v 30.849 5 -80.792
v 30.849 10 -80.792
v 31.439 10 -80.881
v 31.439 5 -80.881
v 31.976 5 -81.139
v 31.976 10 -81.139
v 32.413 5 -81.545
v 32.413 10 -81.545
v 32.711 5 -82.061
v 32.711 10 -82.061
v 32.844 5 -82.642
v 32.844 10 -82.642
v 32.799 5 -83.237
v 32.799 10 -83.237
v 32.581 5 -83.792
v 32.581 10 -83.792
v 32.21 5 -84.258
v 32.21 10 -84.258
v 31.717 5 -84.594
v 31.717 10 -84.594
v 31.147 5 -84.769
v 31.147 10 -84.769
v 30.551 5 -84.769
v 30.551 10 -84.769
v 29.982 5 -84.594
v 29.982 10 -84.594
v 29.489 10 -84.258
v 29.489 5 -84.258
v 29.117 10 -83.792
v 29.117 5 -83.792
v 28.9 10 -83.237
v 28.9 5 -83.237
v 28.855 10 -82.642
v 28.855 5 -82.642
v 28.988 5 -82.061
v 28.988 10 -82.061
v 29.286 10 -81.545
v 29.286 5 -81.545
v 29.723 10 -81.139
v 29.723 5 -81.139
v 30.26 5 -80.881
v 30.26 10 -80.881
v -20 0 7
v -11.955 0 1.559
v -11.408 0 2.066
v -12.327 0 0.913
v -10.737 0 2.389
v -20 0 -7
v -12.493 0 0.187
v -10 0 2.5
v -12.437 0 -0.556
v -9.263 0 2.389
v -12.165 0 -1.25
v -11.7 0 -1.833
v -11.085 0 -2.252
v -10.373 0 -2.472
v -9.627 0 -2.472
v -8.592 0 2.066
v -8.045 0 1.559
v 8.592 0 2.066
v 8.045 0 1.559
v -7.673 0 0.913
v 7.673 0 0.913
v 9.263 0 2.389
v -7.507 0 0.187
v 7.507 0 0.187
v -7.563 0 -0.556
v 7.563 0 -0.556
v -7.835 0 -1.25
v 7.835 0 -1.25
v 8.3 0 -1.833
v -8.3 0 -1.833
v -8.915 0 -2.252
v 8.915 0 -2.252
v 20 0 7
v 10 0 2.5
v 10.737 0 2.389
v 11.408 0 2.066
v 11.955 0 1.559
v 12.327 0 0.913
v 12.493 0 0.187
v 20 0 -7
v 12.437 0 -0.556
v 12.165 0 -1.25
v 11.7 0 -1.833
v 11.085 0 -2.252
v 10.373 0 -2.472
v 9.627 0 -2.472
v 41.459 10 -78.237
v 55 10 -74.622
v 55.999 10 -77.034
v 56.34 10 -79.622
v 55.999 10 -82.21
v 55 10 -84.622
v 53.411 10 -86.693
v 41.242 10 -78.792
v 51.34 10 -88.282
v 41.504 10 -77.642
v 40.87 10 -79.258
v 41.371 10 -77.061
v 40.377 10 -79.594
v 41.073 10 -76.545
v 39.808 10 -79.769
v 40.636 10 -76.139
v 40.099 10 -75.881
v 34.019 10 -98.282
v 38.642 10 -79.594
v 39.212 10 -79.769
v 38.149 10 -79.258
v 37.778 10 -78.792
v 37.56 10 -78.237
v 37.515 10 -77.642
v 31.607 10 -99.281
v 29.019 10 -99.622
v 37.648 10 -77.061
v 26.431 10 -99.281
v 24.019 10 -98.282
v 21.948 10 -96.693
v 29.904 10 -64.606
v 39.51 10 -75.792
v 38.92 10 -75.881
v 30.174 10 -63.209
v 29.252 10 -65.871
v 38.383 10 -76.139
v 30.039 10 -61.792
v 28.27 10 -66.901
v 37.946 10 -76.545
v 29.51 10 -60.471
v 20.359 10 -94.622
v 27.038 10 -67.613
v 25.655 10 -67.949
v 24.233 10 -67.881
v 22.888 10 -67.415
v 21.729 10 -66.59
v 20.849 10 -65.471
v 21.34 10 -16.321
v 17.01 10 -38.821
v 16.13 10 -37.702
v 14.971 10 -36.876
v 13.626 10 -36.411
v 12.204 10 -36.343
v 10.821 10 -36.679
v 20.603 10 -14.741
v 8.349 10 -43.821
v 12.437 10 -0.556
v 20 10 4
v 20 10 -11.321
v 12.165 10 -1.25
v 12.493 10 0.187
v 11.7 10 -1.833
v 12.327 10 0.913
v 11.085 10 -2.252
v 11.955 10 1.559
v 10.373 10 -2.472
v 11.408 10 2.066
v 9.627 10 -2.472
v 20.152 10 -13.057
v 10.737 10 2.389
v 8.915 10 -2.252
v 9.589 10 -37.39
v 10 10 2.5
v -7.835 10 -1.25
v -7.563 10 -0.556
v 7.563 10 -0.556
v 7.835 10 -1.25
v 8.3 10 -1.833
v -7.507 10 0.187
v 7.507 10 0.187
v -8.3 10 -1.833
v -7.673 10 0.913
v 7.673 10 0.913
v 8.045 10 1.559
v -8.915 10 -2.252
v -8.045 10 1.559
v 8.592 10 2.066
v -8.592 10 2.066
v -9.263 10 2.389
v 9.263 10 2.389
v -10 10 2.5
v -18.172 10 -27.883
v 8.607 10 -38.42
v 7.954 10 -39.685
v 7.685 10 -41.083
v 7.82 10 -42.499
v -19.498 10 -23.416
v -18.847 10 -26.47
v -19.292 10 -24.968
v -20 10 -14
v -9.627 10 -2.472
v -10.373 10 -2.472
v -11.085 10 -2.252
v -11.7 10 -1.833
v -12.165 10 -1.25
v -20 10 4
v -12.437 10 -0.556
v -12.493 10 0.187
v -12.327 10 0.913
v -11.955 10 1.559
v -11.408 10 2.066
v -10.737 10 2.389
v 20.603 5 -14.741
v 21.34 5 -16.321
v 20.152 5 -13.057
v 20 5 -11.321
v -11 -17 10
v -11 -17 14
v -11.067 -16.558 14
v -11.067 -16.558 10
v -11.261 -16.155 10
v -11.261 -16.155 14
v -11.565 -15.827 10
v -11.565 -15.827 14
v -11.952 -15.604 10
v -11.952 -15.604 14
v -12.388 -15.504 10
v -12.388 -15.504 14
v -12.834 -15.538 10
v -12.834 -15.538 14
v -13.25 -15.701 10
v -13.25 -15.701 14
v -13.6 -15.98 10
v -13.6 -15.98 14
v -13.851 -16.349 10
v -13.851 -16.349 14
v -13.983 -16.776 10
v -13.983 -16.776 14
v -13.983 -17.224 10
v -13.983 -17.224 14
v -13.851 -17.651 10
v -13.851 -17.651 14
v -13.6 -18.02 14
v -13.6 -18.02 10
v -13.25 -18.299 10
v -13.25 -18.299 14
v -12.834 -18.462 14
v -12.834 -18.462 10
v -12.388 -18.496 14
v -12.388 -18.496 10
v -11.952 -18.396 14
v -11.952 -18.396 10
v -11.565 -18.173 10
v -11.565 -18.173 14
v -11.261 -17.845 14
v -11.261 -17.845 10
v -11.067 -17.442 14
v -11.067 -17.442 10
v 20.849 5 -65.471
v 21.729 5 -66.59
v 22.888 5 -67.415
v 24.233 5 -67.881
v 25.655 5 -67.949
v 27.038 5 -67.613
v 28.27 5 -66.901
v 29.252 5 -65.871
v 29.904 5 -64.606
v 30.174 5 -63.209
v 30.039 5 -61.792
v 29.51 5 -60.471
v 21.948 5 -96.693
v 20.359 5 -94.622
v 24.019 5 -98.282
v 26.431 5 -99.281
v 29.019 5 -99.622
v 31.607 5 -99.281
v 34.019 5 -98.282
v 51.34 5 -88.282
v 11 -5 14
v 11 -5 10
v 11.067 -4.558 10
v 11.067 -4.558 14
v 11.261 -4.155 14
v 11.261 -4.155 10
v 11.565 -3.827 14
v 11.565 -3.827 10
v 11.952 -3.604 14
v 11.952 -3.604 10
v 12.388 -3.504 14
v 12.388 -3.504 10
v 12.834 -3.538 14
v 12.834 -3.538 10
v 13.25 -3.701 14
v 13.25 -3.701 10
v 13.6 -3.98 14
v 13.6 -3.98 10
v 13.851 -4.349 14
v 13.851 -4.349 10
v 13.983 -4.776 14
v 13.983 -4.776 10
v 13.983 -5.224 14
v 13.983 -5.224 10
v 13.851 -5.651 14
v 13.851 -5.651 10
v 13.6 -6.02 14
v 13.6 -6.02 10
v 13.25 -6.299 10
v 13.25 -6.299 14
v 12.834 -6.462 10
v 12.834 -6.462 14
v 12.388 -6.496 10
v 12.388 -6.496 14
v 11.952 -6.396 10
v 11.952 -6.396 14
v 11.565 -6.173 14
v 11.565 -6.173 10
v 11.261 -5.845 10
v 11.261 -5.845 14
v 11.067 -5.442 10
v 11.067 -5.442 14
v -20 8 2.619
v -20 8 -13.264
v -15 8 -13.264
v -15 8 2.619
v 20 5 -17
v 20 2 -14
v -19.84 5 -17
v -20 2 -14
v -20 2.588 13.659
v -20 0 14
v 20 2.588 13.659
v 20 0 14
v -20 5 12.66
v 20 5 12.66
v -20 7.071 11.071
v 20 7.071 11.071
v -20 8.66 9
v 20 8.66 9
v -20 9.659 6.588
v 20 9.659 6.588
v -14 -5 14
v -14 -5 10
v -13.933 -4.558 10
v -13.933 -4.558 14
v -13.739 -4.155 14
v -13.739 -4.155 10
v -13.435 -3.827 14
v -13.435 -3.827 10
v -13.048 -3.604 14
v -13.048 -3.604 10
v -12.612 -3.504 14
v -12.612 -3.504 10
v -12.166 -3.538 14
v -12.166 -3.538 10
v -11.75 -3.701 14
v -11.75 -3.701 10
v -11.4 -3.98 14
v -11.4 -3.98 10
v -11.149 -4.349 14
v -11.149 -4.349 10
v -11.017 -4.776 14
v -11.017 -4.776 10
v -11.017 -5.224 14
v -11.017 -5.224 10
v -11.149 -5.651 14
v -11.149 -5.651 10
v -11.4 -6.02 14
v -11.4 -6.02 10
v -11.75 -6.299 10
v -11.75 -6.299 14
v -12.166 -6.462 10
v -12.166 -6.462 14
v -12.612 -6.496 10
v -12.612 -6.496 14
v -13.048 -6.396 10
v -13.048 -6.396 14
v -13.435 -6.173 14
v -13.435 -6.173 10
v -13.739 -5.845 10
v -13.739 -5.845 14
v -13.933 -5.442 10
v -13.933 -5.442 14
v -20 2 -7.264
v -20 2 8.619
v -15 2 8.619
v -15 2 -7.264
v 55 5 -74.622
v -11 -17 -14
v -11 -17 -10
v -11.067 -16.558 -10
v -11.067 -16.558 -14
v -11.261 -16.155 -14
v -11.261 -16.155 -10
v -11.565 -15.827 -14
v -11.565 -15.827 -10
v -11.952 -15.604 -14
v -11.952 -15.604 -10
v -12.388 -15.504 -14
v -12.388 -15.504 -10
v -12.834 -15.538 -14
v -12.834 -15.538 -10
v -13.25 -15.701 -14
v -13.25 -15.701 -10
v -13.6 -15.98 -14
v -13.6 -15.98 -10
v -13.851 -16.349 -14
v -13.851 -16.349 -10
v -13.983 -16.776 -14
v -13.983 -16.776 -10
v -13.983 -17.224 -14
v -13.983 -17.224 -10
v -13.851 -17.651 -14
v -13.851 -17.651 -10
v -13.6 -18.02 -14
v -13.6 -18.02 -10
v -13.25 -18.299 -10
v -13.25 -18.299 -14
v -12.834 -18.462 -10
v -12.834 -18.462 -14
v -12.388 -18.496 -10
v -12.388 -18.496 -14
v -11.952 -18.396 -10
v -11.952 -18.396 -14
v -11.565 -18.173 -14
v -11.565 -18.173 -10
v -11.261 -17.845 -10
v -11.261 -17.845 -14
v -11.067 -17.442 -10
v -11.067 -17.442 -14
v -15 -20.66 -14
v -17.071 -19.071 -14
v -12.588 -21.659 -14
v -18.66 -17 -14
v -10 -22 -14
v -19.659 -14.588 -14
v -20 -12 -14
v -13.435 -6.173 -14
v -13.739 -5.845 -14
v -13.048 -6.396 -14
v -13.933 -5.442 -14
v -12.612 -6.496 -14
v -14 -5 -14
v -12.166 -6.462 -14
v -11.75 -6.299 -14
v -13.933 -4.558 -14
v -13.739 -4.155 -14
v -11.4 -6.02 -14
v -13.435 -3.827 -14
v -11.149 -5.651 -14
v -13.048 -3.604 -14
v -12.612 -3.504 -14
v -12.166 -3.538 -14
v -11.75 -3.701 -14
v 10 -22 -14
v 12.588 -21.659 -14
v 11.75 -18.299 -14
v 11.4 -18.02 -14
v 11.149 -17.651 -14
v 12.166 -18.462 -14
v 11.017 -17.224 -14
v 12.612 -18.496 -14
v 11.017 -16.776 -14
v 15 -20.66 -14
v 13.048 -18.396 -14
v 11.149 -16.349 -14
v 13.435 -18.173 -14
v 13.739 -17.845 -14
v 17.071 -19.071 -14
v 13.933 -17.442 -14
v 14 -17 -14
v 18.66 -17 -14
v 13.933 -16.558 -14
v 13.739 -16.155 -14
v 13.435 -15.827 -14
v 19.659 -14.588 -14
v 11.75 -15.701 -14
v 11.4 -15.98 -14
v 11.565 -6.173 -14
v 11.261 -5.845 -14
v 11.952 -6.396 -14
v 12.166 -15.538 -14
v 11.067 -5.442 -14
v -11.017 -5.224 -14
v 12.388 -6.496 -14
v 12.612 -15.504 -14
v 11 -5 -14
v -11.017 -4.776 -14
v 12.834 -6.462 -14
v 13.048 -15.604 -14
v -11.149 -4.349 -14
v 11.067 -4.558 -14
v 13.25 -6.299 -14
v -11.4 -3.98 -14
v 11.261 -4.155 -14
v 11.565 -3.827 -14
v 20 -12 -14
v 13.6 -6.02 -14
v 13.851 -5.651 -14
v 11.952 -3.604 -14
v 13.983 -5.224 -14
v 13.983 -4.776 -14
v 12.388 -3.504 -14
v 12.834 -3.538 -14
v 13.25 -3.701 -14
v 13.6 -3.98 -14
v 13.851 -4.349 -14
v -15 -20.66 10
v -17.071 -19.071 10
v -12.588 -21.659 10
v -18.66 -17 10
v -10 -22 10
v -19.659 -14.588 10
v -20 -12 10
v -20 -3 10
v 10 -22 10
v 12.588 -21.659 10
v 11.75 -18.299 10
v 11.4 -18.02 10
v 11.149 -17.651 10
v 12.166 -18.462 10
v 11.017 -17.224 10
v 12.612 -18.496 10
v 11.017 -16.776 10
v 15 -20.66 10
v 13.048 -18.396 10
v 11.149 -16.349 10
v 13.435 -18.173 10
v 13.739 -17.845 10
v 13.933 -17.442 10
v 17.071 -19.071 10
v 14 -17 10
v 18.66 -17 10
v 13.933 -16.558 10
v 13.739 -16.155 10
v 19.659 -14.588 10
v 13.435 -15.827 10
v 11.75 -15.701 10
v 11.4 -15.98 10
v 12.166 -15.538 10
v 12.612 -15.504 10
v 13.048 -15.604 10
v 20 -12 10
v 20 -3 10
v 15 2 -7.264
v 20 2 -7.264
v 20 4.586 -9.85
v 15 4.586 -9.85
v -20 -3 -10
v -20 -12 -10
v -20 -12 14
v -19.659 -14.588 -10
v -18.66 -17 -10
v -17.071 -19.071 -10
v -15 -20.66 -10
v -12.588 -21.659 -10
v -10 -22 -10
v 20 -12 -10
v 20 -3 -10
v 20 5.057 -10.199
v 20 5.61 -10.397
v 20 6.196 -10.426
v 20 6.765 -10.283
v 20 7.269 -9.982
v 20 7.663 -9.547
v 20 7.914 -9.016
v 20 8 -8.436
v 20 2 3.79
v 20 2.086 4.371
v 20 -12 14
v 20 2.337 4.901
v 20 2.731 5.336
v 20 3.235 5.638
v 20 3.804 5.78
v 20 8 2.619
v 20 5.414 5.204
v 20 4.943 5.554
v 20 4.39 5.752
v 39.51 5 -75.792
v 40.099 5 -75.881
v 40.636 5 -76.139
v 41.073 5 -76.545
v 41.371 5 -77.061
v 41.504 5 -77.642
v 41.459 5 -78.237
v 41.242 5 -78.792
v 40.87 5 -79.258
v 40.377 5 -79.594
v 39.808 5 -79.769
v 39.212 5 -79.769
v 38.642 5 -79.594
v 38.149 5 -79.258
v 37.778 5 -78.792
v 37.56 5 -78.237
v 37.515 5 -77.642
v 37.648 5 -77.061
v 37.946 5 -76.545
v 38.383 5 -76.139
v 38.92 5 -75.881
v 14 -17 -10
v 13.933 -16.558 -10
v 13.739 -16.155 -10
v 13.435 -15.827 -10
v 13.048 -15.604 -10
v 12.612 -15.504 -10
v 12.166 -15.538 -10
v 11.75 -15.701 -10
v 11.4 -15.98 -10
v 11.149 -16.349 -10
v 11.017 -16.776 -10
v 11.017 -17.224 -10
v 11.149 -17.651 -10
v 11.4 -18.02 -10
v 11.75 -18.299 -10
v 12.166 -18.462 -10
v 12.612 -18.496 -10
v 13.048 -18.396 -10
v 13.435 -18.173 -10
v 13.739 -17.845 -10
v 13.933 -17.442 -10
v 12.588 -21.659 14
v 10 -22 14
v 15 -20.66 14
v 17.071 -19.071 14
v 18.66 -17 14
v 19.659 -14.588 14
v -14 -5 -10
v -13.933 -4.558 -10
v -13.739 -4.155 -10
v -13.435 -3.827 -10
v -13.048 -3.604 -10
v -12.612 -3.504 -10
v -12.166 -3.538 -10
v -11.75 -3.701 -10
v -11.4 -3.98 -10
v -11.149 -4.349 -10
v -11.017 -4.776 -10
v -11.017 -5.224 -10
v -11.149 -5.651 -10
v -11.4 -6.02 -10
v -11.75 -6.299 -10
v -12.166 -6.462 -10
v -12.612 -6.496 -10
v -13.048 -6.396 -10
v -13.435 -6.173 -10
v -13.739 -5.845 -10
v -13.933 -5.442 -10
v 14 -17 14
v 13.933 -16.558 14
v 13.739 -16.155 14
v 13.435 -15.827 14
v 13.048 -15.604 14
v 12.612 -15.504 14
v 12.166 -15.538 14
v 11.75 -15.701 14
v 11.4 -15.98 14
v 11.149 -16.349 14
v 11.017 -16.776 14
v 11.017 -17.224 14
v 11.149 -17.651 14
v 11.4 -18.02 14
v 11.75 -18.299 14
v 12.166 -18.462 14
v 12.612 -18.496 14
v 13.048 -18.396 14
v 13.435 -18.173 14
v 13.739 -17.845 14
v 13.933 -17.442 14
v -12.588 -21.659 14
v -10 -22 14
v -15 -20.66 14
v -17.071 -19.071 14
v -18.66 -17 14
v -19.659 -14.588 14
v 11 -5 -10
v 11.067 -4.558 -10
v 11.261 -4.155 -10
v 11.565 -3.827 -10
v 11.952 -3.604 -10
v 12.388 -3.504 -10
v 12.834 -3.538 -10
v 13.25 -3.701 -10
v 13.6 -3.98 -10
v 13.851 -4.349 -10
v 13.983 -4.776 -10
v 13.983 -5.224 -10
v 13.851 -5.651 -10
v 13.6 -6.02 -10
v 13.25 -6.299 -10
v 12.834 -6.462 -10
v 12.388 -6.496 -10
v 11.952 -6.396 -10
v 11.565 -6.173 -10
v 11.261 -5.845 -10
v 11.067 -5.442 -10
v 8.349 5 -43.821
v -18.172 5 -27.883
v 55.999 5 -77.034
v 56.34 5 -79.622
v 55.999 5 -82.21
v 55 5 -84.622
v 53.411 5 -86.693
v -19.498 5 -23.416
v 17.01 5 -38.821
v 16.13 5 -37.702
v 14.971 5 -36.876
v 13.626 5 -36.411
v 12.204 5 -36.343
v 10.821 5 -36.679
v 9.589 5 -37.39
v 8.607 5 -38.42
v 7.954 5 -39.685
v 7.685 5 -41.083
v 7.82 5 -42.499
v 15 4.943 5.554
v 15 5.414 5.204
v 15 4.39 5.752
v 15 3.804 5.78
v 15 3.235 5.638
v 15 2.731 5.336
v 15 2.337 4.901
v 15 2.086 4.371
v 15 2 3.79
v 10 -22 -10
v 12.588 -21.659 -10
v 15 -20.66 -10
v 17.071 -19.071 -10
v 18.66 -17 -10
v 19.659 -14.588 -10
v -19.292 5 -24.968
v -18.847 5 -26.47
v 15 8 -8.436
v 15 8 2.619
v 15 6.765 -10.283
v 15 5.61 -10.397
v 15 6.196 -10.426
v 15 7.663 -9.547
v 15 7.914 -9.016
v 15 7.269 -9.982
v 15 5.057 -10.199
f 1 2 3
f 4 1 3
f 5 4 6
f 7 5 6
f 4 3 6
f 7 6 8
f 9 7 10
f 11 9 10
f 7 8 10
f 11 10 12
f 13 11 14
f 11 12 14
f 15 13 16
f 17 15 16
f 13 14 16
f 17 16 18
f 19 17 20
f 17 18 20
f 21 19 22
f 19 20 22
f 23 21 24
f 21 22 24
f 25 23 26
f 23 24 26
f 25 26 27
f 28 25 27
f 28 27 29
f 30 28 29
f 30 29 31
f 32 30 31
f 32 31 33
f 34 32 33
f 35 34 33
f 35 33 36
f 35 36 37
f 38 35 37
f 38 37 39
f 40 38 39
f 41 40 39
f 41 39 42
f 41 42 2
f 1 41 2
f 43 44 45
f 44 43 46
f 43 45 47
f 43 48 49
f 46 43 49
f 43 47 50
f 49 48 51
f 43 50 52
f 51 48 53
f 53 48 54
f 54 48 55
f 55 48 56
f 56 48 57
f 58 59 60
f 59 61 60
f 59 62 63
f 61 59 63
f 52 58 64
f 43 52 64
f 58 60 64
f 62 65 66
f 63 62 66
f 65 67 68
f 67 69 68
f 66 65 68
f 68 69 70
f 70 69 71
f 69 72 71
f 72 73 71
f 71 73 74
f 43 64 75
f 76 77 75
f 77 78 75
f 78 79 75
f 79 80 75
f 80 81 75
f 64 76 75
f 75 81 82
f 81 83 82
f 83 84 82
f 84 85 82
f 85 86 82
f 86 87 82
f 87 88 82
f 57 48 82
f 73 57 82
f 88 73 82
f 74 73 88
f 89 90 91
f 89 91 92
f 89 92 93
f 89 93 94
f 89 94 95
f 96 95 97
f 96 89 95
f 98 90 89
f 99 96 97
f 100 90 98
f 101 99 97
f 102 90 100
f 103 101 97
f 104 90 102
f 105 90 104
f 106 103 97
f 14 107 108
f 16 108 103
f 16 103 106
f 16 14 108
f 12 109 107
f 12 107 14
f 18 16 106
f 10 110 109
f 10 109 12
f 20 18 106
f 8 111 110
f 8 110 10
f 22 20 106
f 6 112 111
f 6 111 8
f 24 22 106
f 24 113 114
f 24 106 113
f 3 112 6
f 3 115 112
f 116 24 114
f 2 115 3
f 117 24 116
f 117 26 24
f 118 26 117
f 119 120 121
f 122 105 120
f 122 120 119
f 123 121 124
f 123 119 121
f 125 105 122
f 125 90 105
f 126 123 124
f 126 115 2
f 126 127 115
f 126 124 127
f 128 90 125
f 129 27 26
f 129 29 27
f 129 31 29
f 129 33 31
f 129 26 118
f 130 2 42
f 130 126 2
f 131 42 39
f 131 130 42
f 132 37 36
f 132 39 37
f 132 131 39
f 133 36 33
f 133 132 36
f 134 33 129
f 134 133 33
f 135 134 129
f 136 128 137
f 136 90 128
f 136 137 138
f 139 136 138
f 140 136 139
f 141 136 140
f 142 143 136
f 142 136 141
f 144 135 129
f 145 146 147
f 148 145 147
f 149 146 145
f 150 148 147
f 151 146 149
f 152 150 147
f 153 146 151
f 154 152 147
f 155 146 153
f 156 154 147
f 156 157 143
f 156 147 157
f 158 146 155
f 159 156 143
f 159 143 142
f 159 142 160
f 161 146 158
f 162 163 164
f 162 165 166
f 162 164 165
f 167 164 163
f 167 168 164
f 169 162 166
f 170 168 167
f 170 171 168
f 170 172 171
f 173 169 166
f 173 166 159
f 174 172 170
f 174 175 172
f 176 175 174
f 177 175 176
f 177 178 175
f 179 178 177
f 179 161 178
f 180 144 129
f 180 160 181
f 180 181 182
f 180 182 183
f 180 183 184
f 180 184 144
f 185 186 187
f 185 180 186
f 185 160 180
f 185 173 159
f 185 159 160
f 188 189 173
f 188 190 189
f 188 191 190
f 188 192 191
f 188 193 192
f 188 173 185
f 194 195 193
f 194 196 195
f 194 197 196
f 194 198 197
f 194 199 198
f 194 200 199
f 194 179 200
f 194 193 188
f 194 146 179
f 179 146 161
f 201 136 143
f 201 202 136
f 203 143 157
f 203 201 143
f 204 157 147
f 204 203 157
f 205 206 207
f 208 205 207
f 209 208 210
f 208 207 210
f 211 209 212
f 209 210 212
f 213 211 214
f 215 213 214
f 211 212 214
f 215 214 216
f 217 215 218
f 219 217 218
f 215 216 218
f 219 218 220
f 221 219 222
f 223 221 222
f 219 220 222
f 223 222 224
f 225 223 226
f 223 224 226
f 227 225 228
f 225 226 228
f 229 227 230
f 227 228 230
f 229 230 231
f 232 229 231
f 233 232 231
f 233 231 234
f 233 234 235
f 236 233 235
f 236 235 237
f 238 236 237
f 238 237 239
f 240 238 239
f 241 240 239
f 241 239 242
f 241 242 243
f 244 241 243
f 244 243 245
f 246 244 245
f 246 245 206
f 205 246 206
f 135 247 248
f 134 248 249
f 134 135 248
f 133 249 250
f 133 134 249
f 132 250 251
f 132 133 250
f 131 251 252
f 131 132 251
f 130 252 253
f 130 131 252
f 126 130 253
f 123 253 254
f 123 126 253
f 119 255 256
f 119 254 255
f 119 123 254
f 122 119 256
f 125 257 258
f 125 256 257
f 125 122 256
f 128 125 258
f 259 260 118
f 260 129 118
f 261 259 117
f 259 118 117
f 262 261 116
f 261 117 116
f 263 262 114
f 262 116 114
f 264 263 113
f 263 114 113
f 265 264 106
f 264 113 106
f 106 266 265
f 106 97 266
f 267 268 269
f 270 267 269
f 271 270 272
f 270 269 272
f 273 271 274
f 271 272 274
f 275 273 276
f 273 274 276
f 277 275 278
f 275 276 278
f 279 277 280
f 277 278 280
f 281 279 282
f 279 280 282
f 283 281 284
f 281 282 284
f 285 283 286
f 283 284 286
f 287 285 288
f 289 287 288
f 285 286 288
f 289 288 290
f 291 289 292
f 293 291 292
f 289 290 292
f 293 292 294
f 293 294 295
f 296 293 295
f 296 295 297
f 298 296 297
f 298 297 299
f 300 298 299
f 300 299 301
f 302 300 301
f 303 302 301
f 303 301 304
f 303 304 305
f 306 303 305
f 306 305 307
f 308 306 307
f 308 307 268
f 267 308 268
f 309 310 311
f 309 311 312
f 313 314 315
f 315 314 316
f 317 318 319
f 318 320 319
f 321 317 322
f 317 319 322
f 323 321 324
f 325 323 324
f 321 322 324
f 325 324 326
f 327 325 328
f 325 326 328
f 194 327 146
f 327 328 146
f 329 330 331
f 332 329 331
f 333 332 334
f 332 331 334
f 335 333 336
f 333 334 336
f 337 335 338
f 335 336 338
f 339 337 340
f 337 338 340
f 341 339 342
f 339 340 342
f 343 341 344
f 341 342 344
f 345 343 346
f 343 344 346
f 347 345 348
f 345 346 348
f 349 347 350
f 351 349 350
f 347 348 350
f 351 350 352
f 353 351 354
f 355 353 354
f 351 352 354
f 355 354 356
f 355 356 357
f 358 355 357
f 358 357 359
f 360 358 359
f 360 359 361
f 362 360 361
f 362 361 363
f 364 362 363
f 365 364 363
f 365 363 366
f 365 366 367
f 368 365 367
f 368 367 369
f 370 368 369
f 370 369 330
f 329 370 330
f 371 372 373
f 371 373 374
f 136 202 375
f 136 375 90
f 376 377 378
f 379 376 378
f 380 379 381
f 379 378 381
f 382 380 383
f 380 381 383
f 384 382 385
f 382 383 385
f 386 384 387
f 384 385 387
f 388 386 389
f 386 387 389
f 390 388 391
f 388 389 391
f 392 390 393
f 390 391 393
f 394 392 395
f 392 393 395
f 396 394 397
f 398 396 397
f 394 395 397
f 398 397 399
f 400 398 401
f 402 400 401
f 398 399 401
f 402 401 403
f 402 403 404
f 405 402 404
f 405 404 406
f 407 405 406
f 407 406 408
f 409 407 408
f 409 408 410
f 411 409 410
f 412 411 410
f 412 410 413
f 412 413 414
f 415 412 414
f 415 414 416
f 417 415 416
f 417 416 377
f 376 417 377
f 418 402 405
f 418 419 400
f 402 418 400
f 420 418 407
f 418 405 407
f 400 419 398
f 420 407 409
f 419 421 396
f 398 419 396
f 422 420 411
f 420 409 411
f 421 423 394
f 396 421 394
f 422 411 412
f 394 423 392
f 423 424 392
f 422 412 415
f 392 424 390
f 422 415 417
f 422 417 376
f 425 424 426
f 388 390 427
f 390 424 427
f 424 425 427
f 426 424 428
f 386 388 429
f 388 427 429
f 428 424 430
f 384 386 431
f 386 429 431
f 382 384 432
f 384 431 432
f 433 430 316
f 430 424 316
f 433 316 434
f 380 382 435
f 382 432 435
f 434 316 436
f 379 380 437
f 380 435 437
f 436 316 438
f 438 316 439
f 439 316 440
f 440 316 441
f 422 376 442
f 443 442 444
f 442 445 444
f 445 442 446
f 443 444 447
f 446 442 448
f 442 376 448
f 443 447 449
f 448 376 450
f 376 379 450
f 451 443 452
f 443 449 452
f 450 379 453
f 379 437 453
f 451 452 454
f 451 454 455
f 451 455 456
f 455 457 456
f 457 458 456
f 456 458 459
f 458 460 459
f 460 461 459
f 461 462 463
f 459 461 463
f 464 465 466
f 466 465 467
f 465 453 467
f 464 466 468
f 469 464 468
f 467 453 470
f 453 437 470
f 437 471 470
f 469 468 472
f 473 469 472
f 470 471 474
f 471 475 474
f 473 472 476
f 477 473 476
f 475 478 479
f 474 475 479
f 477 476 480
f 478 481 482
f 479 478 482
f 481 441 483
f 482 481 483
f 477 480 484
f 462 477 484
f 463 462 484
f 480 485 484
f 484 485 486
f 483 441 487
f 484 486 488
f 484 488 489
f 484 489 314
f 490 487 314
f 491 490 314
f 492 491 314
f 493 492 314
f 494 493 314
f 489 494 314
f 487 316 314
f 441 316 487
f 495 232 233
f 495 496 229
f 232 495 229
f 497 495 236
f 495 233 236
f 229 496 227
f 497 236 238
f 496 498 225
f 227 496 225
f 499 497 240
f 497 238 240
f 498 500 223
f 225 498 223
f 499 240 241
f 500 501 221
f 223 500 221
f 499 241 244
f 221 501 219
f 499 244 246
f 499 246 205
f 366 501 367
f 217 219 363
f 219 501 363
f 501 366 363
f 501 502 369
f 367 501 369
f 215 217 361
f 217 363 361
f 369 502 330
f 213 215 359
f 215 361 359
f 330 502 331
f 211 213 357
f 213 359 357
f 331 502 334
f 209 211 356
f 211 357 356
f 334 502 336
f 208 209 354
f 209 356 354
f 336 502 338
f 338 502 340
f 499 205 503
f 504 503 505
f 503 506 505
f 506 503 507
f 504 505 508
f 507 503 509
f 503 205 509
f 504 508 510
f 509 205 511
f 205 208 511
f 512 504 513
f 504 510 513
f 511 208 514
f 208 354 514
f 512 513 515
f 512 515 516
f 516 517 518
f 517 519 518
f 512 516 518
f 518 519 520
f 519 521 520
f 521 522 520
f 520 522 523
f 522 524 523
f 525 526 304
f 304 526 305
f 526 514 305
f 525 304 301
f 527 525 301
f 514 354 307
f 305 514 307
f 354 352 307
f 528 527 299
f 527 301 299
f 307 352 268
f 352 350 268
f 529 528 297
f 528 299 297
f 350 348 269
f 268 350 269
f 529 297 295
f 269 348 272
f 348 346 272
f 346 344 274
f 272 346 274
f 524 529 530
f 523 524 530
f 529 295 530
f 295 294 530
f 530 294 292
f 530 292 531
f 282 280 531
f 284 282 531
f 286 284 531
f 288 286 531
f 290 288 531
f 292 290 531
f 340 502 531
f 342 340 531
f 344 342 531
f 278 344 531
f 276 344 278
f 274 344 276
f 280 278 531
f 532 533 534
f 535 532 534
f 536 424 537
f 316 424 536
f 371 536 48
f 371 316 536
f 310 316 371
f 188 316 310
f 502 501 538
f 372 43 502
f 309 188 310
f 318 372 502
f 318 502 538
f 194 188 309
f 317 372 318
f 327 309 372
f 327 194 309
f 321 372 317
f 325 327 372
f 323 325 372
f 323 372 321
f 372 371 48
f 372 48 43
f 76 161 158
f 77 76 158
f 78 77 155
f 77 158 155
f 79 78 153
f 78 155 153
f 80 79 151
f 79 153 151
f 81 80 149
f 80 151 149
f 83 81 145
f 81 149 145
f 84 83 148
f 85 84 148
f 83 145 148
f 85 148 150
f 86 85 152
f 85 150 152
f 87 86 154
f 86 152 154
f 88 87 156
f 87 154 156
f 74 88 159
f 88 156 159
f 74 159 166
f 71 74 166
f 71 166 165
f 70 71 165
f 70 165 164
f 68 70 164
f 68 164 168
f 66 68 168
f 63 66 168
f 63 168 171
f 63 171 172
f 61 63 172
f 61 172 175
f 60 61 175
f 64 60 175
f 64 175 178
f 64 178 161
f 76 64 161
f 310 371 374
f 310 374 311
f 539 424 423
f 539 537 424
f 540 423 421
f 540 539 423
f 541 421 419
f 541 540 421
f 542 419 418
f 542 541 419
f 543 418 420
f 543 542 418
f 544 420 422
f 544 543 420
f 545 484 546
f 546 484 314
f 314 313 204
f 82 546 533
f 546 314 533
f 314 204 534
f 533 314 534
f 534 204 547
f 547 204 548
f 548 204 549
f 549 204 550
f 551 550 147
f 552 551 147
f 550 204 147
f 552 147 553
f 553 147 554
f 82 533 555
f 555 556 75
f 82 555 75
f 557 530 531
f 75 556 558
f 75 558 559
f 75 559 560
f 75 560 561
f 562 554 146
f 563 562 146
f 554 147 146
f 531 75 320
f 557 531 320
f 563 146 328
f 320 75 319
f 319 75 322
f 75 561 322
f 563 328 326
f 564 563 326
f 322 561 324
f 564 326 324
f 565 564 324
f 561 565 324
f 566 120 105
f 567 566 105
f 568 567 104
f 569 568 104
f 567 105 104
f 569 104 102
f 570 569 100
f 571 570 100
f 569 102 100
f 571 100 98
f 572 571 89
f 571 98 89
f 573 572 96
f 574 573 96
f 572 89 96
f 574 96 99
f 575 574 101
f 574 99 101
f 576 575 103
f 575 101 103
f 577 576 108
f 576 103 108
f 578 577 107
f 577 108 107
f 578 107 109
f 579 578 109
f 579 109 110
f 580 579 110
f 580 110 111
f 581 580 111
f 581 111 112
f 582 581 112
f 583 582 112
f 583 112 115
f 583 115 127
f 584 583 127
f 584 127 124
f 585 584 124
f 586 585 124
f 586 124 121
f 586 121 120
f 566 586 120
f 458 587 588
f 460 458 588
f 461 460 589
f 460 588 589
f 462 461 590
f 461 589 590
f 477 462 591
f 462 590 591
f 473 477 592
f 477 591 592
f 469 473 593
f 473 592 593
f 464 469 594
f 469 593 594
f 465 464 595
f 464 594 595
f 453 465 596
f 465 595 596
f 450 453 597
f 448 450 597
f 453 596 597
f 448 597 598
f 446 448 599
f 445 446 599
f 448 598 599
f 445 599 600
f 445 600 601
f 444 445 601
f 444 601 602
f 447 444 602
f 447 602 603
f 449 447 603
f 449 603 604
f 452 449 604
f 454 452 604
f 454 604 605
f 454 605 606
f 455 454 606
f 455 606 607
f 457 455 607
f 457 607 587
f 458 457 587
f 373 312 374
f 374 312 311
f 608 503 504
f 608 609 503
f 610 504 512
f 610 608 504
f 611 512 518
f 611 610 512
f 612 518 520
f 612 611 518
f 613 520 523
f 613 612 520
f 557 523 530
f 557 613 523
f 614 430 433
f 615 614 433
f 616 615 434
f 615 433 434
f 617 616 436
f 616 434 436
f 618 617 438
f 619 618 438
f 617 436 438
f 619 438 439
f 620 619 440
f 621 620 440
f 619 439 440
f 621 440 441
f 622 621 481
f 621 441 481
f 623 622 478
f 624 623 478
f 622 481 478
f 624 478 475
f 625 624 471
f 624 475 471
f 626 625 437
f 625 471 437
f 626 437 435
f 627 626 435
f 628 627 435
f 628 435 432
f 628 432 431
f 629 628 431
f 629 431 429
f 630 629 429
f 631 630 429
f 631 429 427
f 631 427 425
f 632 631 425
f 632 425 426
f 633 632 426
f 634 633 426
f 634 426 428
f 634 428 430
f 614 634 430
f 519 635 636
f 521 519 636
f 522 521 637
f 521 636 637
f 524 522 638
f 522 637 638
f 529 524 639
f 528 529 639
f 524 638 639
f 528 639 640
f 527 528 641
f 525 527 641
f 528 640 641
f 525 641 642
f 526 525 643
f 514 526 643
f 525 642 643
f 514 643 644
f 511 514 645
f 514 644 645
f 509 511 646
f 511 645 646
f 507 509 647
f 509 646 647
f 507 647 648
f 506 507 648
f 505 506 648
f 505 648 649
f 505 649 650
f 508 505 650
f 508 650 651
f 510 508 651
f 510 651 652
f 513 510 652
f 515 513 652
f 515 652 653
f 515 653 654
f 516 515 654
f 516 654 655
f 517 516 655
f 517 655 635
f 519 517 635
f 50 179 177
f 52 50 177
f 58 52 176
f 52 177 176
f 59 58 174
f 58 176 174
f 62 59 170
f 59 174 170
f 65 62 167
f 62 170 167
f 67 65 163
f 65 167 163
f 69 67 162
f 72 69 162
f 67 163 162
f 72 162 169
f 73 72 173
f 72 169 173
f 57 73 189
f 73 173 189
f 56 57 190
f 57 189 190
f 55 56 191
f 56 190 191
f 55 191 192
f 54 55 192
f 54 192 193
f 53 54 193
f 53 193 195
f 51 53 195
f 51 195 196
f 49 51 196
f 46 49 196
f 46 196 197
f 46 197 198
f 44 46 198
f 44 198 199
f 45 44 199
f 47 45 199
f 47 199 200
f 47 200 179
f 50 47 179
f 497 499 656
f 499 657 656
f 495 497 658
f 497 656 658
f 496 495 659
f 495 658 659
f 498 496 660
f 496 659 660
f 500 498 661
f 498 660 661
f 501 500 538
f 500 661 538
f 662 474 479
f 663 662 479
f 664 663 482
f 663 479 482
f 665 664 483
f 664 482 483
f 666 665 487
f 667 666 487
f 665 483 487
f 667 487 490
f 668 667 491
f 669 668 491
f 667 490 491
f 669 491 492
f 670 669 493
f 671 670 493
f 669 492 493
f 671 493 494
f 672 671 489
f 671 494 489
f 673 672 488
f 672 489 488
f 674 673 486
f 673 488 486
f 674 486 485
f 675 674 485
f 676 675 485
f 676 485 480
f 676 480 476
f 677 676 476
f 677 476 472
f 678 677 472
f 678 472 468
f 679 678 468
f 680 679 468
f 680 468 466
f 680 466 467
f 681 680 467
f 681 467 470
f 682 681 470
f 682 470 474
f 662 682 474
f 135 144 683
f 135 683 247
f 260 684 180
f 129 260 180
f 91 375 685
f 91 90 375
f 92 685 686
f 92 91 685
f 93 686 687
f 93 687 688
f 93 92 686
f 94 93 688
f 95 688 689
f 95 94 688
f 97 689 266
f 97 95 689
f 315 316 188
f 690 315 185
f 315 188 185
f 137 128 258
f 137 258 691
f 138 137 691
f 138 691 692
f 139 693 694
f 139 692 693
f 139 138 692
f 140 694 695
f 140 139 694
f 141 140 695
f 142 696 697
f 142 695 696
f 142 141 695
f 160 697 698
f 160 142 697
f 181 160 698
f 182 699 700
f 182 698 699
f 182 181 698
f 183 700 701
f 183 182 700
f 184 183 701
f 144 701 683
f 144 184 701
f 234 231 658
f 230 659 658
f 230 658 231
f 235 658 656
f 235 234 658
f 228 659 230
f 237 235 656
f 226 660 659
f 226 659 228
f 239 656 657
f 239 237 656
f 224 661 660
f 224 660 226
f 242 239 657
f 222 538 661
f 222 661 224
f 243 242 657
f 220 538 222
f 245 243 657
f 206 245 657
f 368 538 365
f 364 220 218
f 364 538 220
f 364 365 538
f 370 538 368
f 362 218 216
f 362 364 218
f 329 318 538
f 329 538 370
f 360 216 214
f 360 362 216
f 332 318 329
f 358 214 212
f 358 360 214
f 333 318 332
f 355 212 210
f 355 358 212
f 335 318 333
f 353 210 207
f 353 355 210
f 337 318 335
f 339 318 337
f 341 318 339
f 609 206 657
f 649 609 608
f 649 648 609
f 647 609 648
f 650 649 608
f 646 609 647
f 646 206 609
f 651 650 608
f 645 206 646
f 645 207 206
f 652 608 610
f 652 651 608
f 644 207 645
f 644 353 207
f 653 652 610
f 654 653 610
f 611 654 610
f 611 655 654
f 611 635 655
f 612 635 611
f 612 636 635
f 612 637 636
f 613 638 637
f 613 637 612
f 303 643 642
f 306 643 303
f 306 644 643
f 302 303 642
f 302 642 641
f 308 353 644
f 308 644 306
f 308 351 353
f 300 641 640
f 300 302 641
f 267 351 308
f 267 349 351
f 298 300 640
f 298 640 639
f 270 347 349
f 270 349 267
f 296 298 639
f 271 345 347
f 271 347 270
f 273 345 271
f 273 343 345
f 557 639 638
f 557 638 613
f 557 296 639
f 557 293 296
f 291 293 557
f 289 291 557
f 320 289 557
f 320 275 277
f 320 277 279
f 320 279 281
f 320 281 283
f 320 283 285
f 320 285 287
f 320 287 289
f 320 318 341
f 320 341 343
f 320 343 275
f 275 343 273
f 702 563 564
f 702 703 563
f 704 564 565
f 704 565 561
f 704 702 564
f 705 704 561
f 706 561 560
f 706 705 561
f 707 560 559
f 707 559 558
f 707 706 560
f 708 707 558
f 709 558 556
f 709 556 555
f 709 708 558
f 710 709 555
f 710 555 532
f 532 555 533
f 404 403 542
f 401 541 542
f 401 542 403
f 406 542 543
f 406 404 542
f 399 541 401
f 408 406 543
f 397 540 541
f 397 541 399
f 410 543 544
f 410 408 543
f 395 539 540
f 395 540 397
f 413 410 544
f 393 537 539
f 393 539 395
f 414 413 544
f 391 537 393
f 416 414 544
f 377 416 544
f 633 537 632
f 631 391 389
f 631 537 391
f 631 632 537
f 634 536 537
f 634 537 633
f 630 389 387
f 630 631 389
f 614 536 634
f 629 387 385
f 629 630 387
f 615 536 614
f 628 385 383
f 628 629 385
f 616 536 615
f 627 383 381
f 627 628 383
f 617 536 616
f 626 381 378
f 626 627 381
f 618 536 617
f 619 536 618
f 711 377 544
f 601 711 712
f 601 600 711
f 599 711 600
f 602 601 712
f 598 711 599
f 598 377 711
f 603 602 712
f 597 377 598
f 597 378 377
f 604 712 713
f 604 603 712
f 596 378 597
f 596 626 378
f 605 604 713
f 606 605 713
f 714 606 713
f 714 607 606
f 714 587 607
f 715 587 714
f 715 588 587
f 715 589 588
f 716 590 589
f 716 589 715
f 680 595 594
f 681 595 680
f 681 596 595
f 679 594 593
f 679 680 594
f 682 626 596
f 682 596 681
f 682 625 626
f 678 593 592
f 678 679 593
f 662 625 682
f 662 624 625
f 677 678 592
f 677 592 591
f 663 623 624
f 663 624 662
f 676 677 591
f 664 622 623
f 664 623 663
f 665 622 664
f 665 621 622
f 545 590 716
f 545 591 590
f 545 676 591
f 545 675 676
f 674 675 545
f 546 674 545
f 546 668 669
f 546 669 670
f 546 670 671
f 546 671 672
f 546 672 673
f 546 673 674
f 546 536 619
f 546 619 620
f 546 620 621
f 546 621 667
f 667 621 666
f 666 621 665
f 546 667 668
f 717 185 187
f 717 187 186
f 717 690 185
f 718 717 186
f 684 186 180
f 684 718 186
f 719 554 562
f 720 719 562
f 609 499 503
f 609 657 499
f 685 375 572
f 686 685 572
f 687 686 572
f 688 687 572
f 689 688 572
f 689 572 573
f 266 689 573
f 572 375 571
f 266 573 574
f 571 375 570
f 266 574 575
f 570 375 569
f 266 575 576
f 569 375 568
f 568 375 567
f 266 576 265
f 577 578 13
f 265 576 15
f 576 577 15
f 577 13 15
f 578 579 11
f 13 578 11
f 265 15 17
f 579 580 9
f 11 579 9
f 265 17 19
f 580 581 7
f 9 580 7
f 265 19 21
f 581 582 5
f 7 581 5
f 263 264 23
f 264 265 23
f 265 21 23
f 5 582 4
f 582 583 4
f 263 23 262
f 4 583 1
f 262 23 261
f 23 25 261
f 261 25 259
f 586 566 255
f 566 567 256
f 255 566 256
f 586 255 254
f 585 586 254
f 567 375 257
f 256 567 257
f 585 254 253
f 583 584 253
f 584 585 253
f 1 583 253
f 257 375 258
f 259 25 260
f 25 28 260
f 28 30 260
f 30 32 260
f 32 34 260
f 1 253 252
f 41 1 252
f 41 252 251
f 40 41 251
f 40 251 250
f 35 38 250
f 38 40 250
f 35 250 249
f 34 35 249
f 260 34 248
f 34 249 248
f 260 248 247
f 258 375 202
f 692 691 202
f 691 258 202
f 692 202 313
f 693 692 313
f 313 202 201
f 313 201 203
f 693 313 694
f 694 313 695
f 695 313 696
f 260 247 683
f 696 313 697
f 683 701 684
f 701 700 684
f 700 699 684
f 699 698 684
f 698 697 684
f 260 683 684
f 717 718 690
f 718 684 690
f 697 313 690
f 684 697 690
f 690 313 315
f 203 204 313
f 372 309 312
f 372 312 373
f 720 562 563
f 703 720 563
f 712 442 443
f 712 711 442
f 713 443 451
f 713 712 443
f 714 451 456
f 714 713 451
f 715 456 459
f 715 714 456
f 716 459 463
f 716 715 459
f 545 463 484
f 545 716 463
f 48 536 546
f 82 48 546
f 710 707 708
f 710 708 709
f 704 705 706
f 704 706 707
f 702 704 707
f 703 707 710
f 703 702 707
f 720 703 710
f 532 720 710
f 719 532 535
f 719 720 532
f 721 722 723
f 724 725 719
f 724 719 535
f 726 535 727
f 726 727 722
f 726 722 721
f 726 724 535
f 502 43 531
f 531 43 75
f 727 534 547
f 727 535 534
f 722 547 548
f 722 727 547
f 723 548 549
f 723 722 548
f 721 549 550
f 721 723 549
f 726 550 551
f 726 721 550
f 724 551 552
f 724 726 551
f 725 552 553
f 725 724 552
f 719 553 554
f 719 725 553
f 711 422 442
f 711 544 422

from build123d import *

# Parameters (mm, degrees)
EXTRUDE_1_DEPTH      = 10
SKETCH_2_W           = 40
SKETCH_2_H           = 4
SKETCH_2_H_2         = 3.9999999999999982
EXTRUDE_2_DEPTH      = 10
SKETCH_4_W           = 40
SKETCH_4_H           = 5
EXTRUDE_3_DEPTH      = 15
SKETCH_6_W           = 40
SKETCH_6_H           = 5
EXTRUDE_4_DEPTH      = 15
SKETCH_8_R           = 2.5000000000000004
CUT_EXTRUDE_2_DEPTH  = 15
CHAMFER_1_SIZE       = 3
FILLET_1_R           = 10
CHAMFER_2_SIZE       = 3
SKETCH_9_R           = 1.5000000000000007
CUT_EXTRUDE_3_DEPTH  = 38.41657386773942
CUT_EXTRUDE_4_DEPTH  = 5
FILLET_3_R           = 2
SKETCH_11_W          = 40
SKETCH_11_H          = 6.999999999999998
SKETCH_11_H_2        = 7
EXTRUDE_5_DEPTH      = 3
CHAMFER_3_SIZE       = 1
SKETCH_12_W          = 40
SKETCH_12_H          = 5
EXTRUDE_6_DEPTH      = 30
FILLET_4_R           = 10
SKETCH_13_R          = 2
SKETCH_13_R_2        = 2.0000000000000027
CUT_EXTRUDE_5_DEPTH  = 30
EXTRUDE_START        = -5
EXTRUDE_7_DEPTH      = 5
CUT_EXTRUDE_6_DEPTH  = 5
SKETCH_16_W          = 20.000000000000007
SKETCH_16_H          = 9.517030698893077
CUT_EXTRUDE_7_DEPTH  = 122.15395545343927
SKETCH_17_W          = 40
SKETCH_17_H          = 3.9999999999999982
SKETCH_17_H_2        = 4
EXTRUDE_8_DEPTH      = 12
SKETCH_18_R          = 1.5000000000000007
SKETCH_18_R_2        = 1.5000000000000009
CUT_EXTRUDE_8_DEPTH  = 124.72425272933131
SKETCH_19_R          = 2.0000000000000067
SKETCH_19_R_2        = 2.0000000000000036
CUT_EXTRUDE_9_DEPTH  = 115.02754457592229
CUT_EXTRUDE_10_DEPTH = 115.02754457592229
EXTRUDE_9_DEPTH      = 5
SKETCH_23_R          = 2.0000000000000036
SKETCH_23_R_2        = 2.0000000000000067
CUT_EXTRUDE_11_DEPTH = 115.0275445759223
SKETCH_24_R          = 2.0000000000000067
SKETCH_24_R_2        = 2.0000000000000036
CUT_EXTRUDE_12_DEPTH = 115.02754457592229
CUT_EXTRUDE_13_DEPTH = 115.02754457592229
SKETCH_26_W          = 40
SKETCH_26_H          = 5
EXTRUDE_10_DEPTH     = 10
FILLET_6_R           = 10


with BuildPart() as part:
    # 草图1 → 凸台-拉伸1 (new body)
    with BuildSketch(Plane(origin=(0, 0, 0), x_dir=(1, 0, 0), z_dir=(0, 1, 0))):
        Polygon((20.000000000000004, 14.000000000000007), (-19.999999999999996, 14.000000000000002), (-19.999999999999996, -13.999999999999998), (20.000000000000004, -13.999999999999993), align=None)
    extrude(amount=EXTRUDE_1_DEPTH)

    # 草图2 → 凸台-拉伸2 (add)
    with BuildSketch(Plane.XZ):
        with Locations((3.55e-15, 11.999999999999998)):
            Rectangle(SKETCH_2_W, SKETCH_2_H)
        with Locations((3.55e-15, -12.000000000000007)):
            Rectangle(SKETCH_2_W, SKETCH_2_H_2)
    extrude(amount=EXTRUDE_2_DEPTH)

    # 草图4 → 凸台-拉伸3 (add)
    with BuildSketch(Plane(origin=(-1.82e-15, 0, -14.000000000000004), x_dir=(-1, 0, 1.3e-16), z_dir=(-1.3e-16, 0, -1))):
        with Locations((-7.11e-15, 7.5)):
            Rectangle(SKETCH_4_W, SKETCH_4_H)
    extrude(amount=EXTRUDE_3_DEPTH)

    # 草图6 → 凸台-拉伸4 (add)
    with BuildSketch(Plane(origin=(-3.77e-15, 0, -29.000000000000004), x_dir=(-1, 0, 1.3e-16), z_dir=(-1.3e-16, 0, -1))):
        with Locations((-3.55e-15, 7.5)):
            Rectangle(SKETCH_6_W, SKETCH_6_H)
    extrude(amount=EXTRUDE_4_DEPTH)

    # 草图8 → 切除-拉伸2 (cut)
    with BuildSketch(Plane(origin=(0, 10, 0), x_dir=(1, 0, 0), z_dir=(0, 1, 0))):
        with Locations(Location((-10.000000000000004, 1.73e-15, 0), (0, 0, 270))):
            Circle(SKETCH_8_R)
        with Locations(Location((10.000000000000002, 1.73e-15, 0), (0, 0, 270))):
            Circle(SKETCH_8_R)
    extrude(amount=-CUT_EXTRUDE_2_DEPTH, mode=Mode.SUBTRACT)

    # 倒角1
    chamfer_1_edges = [part.edges().sort_by_distance(p)[0] for p in [
        (3.55e-15, 0, 9.999999999999998),
        (3.55e-15, 0, -10.000000000000007),
    ]]
    chamfer(chamfer_1_edges, length=CHAMFER_1_SIZE)

    # 圆角1
    fillet_1_edges = [part.edges().sort_by_distance(p)[0] for p in [
        (3.55e-15, 10, 13.999999999999996),
    ]]
    fillet(fillet_1_edges, radius=FILLET_1_R)

    # 倒角2
    chamfer_2_edges = [part.edges().sort_by_distance(p)[0] for p in [
        (5.28e-15, 5, -14.000000000000004),
    ]]
    chamfer(chamfer_2_edges, length=CHAMFER_2_SIZE)

    # 草图9 → 切除-拉伸3 (cut, through all)
    with BuildSketch(Plane(origin=(-1.82e-15, 0, -14.000000000000004), x_dir=(-1, 0, 1.3e-16), z_dir=(-1.3e-16, 0, -1))):
        with Locations((-12.500000000000007, -5)):
            Circle(SKETCH_9_R)
        with Locations((12.499999999999993, -5)):
            Circle(SKETCH_9_R)
    extrude(amount=-CUT_EXTRUDE_3_DEPTH, mode=Mode.SUBTRACT)

    # 草图10 → 切除-拉伸4 (cut)
    with BuildSketch(Plane(origin=(20.000000000000004, 0, 0), x_dir=(0, 0, -1), z_dir=(1, 0, 0))):
        Polygon((-2.6185414170321746, 7.999999999999998), (-8.618541417032173, 2), (7.26407194166772, 2), (13.264071941667716, 8), align=None)
    cut_extrude_4 = extrude(amount=-CUT_EXTRUDE_4_DEPTH, mode=Mode.SUBTRACT)

    # 圆角3
    fillet_3_edges = [part.edges().sort_by_distance(p)[0] for p in [
        (17.500000000000004, 8, -13.264071941667716),
        (17.500000000000004, 2, 8.618541417032173),
    ]]
    fillet(fillet_3_edges, radius=FILLET_3_R)

    # 镜向1: 切除-拉伸4 across plane
    add(cut_extrude_4.mirror(Plane(origin=(0, 0, 0), x_dir=(0, 0, 1), z_dir=(1, 0, 0))), mode=Mode.SUBTRACT)

    # 草图11 → 凸台-拉伸5 (add)
    with BuildSketch(Plane.XZ.offset(10)):
        with Locations((3.55e-15, -10.500000000000007)):
            Rectangle(SKETCH_11_W, SKETCH_11_H)
        with Locations((3.55e-15, 10.499999999999998)):
            Rectangle(SKETCH_11_W, SKETCH_11_H_2)
    extrude(amount=-EXTRUDE_5_DEPTH)

    # 倒角3
    chamfer_3_edges = [part.edges().sort_by_distance(p)[0] for p in [
        (3.55e-15, -7, -7.000000000000007),
        (3.55e-15, -7, 6.999999999999998),
    ]]
    chamfer(chamfer_3_edges, length=CHAMFER_3_SIZE)

    # 草图12 → 凸台-拉伸6 (add)
    with BuildSketch(Plane(origin=(-7.63e-15, 0, -44.00000000000001), x_dir=(-1, 0, 1.7e-16), z_dir=(-1.7e-16, 0, -1))):
        with Locations((-3.55e-15, 7.5)):
            Rectangle(SKETCH_12_W, SKETCH_12_H)
    extrude(amount=EXTRUDE_6_DEPTH)

    # 圆角4
    fillet_4_edges = [part.edges().sort_by_distance(p)[0] for p in [
        (19.99999999999999, 7.5, -74),
        (-20.00000000000001, 7.5, -74),
    ]]
    fillet(fillet_4_edges, radius=FILLET_4_R)

    # 草图13 → 切除-拉伸5 (cut)
    with BuildSketch(Plane(origin=(0, 10, 0), x_dir=(1, 0, 0), z_dir=(0, 1, 0))):
        with Locations(Location((9.140000000000004, 70, 0), (0, 0, 270))):
            Circle(SKETCH_13_R)
        with Locations(Location((-0.8599999999999962, 70.00000000000001, 0), (0, 0, 270))):
            Circle(SKETCH_13_R_2)
    extrude(amount=-CUT_EXTRUDE_5_DEPTH, mode=Mode.SUBTRACT)

    # 草图14 → 凸台-拉伸7 (add)
    with BuildSketch(Plane(origin=(0, 10, 0), x_dir=(1, 0, 0), z_dir=(0, 1, 0)).offset(EXTRUDE_START)):
        with BuildLine():
            Line((-19.999999999999996, 64.00000000000001), (-19.999999999999996, 14.000000000000007))
            Line((-19.999999999999996, 14.000000000000007), (20.000000000000004, 14.000000000000007))
            Line((20.000000000000004, 14.000000000000007), (20.000000000000004, 24.71796769724495))
            Line((20.000000000000004, 24.717967697244944), (-8.452994616207512, 74.00000000000003))
            Line((-8.45299461620751, 74.00000000000001), (-9.999999999999998, 74.00000000000001))
            ThreePointArc((-9.999999999999998, 74.00000000000001), (-17.071067811865472, 71.07106781186549), (-19.999999999999996, 64.00000000000001))
        make_face()
        with BuildLine():
            Line((-55.00000000000003, 74.62177826491072), (-19.999999999999996, 14.000000000000007))
            Line((-19.999999999999996, 14.000000000000007), (-19.999999999999996, 64.00000000000001))
            ThreePointArc((-19.999999999999996, 64.00000000000001), (-17.071067811865472, 71.07106781186549), (-9.999999999999998, 74.00000000000001))
            Line((-9.999999999999998, 74.00000000000001), (-8.45299461620751, 74.00000000000001))
            Line((-8.452994616207512, 74.00000000000003), (-20.35898384862252, 94.62177826491077))
            Line((-20.35898384862252, 94.62177826491077), (-55.000000000000014, 74.62177826491072))
        make_face()
    extrude(amount=EXTRUDE_7_DEPTH)

    # 草图15 → 切除-拉伸6 (cut)
    with BuildSketch(Plane(origin=(0, 10, 0), x_dir=(1, 0, 0), z_dir=(0, 1, 0))):
        Polygon((-8.452994616207489, 74.00000000000001), (20.000000000000004, 24.717967697244916), (20.000000000000004, 77.52110183518307), align=None)
    extrude(amount=-CUT_EXTRUDE_6_DEPTH, mode=Mode.SUBTRACT)

    # 草图16 → 切除-拉伸7 (cut, through all)
    with BuildSketch(Plane(origin=(20.000000000000004, 0, 0), x_dir=(0, 0, -1), z_dir=(1, 0, 0))):
        with Locations((4.44e-15, -11.758515349446538)):
            Rectangle(SKETCH_16_W, SKETCH_16_H)
    extrude(amount=-CUT_EXTRUDE_7_DEPTH, mode=Mode.SUBTRACT)

    # 草图17 → 凸台-拉伸8 (add)
    with BuildSketch(Plane.XZ.offset(10)):
        with Locations((3.55e-15, -12.000000000000007)):
            Rectangle(SKETCH_17_W, SKETCH_17_H)
        with Locations((3.55e-15, 11.999999999999998)):
            Rectangle(SKETCH_17_W, SKETCH_17_H_2)
    extrude(amount=EXTRUDE_8_DEPTH)

    # 草图18 → 切除-拉伸8 (cut, through all)
    with BuildSketch(Plane.XY.offset(13.999999999999996)):
        with Locations(Location((-12.499999999999993, -5, 0), (0, 0, 180))):
            Circle(SKETCH_18_R)
        with Locations(Location((12.500000000000007, -5, 0), (0, 0, 180))):
            Circle(SKETCH_18_R)
        with Locations((12.500000000000007, -16.999999999999996)):
            Circle(SKETCH_18_R_2)
        with Locations((-12.499999999999993, -16.999999999999996)):
            Circle(SKETCH_18_R_2)
    extrude(amount=-CUT_EXTRUDE_8_DEPTH, mode=Mode.SUBTRACT)

    # 草图19 → 切除-拉伸9 (cut, through all)
    with BuildSketch(Plane(origin=(0, 10, 0), x_dir=(1, 0, 0), z_dir=(0, 1, 0))):
        with Locations(Location((-30.84936490538909, 82.79165124598856, 0), (0, 0, 270))):
            Circle(SKETCH_19_R)
        with Locations(Location((-39.509618943233484, 77.79165124598855, 0), (0, 0, 270))):
            Circle(SKETCH_19_R_2)
    extrude(amount=-CUT_EXTRUDE_9_DEPTH, mode=Mode.SUBTRACT)

    # 草图20 → 切除-拉伸10 (cut, through all)
    with BuildSketch(Plane(origin=(0, 10, 0), x_dir=(1, 0, 0), z_dir=(0, 1, 0))):
        with BuildLine():
            Line((-22.598956840337568, 65.9859096217943), (-11.740968079891154, 47.17932142068932))
            ThreePointArc((-11.740968079891154, 47.17932142068932), (-13.11070547769434, 42.067391859060635), (-18.22263503932303, 43.43712925686382))
            Line((-18.22263503932303, 43.43712925686382), (-29.080623799769445, 62.2437174579688))
            ThreePointArc((-29.080623799769445, 62.2437174579688), (-27.71088640196626, 67.35564701959748), (-22.598956840337568, 65.9859096217943))
        make_face()
    extrude(amount=-CUT_EXTRUDE_10_DEPTH, mode=Mode.SUBTRACT)

    # 草图22 → 凸台-拉伸9 (add)
    with BuildSketch(Plane(origin=(0, 10, 0), x_dir=(1, 0, 0), z_dir=(0, 1, 0))):
        Polygon((20.000000000000004, 24.717967697244916), (20.000000000000004, 14.000000000000005), (52.185853837740325, 69.74753413195232), (55.00000000000002, 74.62177826491073), (20.35898384862252, 94.62177826491079), (1.066e-14, 59.358983848622465), align=None)
    extrude(amount=-EXTRUDE_9_DEPTH)

    # 草图23 → 切除-拉伸11 (cut, through all)
    # profile 1 of 2: a face of its own
    with BuildSketch(Plane(origin=(0, 10, 0), x_dir=(1, 0, 0), z_dir=(0, 1, 0))):
        Polygon((-19.37046826566082, 25.80834864609737), (-3.47e-15, 59.35898384862246), (-20.35898384862252, 94.62177826491079), (-55.000000000000014, 74.62177826491073), (-23.09401076758504, 19.358983848622493), align=None)
        with BuildLine():
            ThreePointArc((-11.740968079891154, 47.17932142068932), (-13.110705477694344, 42.067391859060635), (-18.22263503932303, 43.43712925686382))
            Line((-18.22263503932303, 43.43712925686382), (-29.080623799769448, 62.24371745796881))
            ThreePointArc((-29.080623799769445, 62.24371745796881), (-27.710886401966246, 67.3556470195975), (-22.598956840337564, 65.9859096217943))
            Line((-22.598956840337568, 65.9859096217943), (-11.740968079891154, 47.17932142068932))
        make_face(mode=Mode.SUBTRACT)
        with Locations((-39.509618943233484, 77.79165124598855)):
            Circle(SKETCH_23_R, mode=Mode.SUBTRACT)
        with Locations((-30.84936490538909, 82.79165124598856)):
            Circle(SKETCH_23_R_2, mode=Mode.SUBTRACT)
    # profile 2 of 2: a face of its own
    with BuildSketch(Plane(origin=(0, 10, 0), x_dir=(1, 0, 0), z_dir=(0, 1, 0))):
        Polygon((-20, 14.00000000000002), (-19.370468265660815, 25.80834864609738), (-23.094010767585043, 19.358983848622486), align=None)
    extrude(amount=-CUT_EXTRUDE_11_DEPTH, mode=Mode.SUBTRACT)

    # 草图24 → 切除-拉伸12 (cut, through all)
    with BuildSketch(Plane(origin=(0, 10, 0), x_dir=(1, 0, 0), z_dir=(0, 1, 0))):
        with Locations(Location((30.849364905389077, 82.79165124598858, 0), (0, 0, 270))):
            Circle(SKETCH_24_R)
        with Locations(Location((39.50961894323347, 77.79165124598856, 0), (0, 0, 270))):
            Circle(SKETCH_24_R_2)
    extrude(amount=-CUT_EXTRUDE_12_DEPTH, mode=Mode.SUBTRACT)

    # 草图25 → 切除-拉伸13 (cut, through all)
    with BuildSketch(Plane(origin=(0, 10, 0), x_dir=(1, 0, 0), z_dir=(0, 1, 0))):
        with BuildLine():
            Line((8.349364905389072, 43.82050807568882), (20.84936490538906, 65.47114317029978))
            ThreePointArc((20.84936490538906, 65.47114317029978), (27.679491924311264, 67.30127018922197), (29.509618943233452, 60.47114317029978))
            Line((29.509618943233452, 60.47114317029978), (17.00961894323346, 38.82050807568883))
            ThreePointArc((17.00961894323346, 38.82050807568883), (10.17949192431127, 36.99038105676664), (8.349364905389072, 43.82050807568882))
        make_face()
    extrude(amount=-CUT_EXTRUDE_13_DEPTH, mode=Mode.SUBTRACT)

    # 草图26 → 凸台-拉伸10 (add)
    with BuildSketch(Plane(origin=(46.06217782649125, 0, -79.78203230275507), x_dir=(-0.8660254037844378, 0, -0.5000000000000016), z_dir=(0.5000000000000016, 0, -0.8660254037844378))):
        with Locations((9.679491924311383, 7.5)):
            Rectangle(SKETCH_26_W, SKETCH_26_H)
    extrude(amount=EXTRUDE_10_DEPTH)

    # 圆角6
    fillet_6_edges = [part.edges().sort_by_distance(p)[0] for p in [
        (-19.999999999999996, -22, -12.000000000000007),
        (-19.999999999999996, -22, 11.999999999999998),
        (20.000000000000004, -22, 11.999999999999998),
        (20.000000000000004, -22, -12.000000000000007),
        (20.000000000000004, 7.5, -14.000000000000007),
        (-19.37046826566082, 7.5, -25.808348646097375),
        (25.358983848622543, 7.5, -103.28203230275518),
        (60.00000000000005, 7.5, -83.28203230275513),
    ]]
    fillet(fillet_6_edges, radius=FILLET_6_R)


solid = part.part
